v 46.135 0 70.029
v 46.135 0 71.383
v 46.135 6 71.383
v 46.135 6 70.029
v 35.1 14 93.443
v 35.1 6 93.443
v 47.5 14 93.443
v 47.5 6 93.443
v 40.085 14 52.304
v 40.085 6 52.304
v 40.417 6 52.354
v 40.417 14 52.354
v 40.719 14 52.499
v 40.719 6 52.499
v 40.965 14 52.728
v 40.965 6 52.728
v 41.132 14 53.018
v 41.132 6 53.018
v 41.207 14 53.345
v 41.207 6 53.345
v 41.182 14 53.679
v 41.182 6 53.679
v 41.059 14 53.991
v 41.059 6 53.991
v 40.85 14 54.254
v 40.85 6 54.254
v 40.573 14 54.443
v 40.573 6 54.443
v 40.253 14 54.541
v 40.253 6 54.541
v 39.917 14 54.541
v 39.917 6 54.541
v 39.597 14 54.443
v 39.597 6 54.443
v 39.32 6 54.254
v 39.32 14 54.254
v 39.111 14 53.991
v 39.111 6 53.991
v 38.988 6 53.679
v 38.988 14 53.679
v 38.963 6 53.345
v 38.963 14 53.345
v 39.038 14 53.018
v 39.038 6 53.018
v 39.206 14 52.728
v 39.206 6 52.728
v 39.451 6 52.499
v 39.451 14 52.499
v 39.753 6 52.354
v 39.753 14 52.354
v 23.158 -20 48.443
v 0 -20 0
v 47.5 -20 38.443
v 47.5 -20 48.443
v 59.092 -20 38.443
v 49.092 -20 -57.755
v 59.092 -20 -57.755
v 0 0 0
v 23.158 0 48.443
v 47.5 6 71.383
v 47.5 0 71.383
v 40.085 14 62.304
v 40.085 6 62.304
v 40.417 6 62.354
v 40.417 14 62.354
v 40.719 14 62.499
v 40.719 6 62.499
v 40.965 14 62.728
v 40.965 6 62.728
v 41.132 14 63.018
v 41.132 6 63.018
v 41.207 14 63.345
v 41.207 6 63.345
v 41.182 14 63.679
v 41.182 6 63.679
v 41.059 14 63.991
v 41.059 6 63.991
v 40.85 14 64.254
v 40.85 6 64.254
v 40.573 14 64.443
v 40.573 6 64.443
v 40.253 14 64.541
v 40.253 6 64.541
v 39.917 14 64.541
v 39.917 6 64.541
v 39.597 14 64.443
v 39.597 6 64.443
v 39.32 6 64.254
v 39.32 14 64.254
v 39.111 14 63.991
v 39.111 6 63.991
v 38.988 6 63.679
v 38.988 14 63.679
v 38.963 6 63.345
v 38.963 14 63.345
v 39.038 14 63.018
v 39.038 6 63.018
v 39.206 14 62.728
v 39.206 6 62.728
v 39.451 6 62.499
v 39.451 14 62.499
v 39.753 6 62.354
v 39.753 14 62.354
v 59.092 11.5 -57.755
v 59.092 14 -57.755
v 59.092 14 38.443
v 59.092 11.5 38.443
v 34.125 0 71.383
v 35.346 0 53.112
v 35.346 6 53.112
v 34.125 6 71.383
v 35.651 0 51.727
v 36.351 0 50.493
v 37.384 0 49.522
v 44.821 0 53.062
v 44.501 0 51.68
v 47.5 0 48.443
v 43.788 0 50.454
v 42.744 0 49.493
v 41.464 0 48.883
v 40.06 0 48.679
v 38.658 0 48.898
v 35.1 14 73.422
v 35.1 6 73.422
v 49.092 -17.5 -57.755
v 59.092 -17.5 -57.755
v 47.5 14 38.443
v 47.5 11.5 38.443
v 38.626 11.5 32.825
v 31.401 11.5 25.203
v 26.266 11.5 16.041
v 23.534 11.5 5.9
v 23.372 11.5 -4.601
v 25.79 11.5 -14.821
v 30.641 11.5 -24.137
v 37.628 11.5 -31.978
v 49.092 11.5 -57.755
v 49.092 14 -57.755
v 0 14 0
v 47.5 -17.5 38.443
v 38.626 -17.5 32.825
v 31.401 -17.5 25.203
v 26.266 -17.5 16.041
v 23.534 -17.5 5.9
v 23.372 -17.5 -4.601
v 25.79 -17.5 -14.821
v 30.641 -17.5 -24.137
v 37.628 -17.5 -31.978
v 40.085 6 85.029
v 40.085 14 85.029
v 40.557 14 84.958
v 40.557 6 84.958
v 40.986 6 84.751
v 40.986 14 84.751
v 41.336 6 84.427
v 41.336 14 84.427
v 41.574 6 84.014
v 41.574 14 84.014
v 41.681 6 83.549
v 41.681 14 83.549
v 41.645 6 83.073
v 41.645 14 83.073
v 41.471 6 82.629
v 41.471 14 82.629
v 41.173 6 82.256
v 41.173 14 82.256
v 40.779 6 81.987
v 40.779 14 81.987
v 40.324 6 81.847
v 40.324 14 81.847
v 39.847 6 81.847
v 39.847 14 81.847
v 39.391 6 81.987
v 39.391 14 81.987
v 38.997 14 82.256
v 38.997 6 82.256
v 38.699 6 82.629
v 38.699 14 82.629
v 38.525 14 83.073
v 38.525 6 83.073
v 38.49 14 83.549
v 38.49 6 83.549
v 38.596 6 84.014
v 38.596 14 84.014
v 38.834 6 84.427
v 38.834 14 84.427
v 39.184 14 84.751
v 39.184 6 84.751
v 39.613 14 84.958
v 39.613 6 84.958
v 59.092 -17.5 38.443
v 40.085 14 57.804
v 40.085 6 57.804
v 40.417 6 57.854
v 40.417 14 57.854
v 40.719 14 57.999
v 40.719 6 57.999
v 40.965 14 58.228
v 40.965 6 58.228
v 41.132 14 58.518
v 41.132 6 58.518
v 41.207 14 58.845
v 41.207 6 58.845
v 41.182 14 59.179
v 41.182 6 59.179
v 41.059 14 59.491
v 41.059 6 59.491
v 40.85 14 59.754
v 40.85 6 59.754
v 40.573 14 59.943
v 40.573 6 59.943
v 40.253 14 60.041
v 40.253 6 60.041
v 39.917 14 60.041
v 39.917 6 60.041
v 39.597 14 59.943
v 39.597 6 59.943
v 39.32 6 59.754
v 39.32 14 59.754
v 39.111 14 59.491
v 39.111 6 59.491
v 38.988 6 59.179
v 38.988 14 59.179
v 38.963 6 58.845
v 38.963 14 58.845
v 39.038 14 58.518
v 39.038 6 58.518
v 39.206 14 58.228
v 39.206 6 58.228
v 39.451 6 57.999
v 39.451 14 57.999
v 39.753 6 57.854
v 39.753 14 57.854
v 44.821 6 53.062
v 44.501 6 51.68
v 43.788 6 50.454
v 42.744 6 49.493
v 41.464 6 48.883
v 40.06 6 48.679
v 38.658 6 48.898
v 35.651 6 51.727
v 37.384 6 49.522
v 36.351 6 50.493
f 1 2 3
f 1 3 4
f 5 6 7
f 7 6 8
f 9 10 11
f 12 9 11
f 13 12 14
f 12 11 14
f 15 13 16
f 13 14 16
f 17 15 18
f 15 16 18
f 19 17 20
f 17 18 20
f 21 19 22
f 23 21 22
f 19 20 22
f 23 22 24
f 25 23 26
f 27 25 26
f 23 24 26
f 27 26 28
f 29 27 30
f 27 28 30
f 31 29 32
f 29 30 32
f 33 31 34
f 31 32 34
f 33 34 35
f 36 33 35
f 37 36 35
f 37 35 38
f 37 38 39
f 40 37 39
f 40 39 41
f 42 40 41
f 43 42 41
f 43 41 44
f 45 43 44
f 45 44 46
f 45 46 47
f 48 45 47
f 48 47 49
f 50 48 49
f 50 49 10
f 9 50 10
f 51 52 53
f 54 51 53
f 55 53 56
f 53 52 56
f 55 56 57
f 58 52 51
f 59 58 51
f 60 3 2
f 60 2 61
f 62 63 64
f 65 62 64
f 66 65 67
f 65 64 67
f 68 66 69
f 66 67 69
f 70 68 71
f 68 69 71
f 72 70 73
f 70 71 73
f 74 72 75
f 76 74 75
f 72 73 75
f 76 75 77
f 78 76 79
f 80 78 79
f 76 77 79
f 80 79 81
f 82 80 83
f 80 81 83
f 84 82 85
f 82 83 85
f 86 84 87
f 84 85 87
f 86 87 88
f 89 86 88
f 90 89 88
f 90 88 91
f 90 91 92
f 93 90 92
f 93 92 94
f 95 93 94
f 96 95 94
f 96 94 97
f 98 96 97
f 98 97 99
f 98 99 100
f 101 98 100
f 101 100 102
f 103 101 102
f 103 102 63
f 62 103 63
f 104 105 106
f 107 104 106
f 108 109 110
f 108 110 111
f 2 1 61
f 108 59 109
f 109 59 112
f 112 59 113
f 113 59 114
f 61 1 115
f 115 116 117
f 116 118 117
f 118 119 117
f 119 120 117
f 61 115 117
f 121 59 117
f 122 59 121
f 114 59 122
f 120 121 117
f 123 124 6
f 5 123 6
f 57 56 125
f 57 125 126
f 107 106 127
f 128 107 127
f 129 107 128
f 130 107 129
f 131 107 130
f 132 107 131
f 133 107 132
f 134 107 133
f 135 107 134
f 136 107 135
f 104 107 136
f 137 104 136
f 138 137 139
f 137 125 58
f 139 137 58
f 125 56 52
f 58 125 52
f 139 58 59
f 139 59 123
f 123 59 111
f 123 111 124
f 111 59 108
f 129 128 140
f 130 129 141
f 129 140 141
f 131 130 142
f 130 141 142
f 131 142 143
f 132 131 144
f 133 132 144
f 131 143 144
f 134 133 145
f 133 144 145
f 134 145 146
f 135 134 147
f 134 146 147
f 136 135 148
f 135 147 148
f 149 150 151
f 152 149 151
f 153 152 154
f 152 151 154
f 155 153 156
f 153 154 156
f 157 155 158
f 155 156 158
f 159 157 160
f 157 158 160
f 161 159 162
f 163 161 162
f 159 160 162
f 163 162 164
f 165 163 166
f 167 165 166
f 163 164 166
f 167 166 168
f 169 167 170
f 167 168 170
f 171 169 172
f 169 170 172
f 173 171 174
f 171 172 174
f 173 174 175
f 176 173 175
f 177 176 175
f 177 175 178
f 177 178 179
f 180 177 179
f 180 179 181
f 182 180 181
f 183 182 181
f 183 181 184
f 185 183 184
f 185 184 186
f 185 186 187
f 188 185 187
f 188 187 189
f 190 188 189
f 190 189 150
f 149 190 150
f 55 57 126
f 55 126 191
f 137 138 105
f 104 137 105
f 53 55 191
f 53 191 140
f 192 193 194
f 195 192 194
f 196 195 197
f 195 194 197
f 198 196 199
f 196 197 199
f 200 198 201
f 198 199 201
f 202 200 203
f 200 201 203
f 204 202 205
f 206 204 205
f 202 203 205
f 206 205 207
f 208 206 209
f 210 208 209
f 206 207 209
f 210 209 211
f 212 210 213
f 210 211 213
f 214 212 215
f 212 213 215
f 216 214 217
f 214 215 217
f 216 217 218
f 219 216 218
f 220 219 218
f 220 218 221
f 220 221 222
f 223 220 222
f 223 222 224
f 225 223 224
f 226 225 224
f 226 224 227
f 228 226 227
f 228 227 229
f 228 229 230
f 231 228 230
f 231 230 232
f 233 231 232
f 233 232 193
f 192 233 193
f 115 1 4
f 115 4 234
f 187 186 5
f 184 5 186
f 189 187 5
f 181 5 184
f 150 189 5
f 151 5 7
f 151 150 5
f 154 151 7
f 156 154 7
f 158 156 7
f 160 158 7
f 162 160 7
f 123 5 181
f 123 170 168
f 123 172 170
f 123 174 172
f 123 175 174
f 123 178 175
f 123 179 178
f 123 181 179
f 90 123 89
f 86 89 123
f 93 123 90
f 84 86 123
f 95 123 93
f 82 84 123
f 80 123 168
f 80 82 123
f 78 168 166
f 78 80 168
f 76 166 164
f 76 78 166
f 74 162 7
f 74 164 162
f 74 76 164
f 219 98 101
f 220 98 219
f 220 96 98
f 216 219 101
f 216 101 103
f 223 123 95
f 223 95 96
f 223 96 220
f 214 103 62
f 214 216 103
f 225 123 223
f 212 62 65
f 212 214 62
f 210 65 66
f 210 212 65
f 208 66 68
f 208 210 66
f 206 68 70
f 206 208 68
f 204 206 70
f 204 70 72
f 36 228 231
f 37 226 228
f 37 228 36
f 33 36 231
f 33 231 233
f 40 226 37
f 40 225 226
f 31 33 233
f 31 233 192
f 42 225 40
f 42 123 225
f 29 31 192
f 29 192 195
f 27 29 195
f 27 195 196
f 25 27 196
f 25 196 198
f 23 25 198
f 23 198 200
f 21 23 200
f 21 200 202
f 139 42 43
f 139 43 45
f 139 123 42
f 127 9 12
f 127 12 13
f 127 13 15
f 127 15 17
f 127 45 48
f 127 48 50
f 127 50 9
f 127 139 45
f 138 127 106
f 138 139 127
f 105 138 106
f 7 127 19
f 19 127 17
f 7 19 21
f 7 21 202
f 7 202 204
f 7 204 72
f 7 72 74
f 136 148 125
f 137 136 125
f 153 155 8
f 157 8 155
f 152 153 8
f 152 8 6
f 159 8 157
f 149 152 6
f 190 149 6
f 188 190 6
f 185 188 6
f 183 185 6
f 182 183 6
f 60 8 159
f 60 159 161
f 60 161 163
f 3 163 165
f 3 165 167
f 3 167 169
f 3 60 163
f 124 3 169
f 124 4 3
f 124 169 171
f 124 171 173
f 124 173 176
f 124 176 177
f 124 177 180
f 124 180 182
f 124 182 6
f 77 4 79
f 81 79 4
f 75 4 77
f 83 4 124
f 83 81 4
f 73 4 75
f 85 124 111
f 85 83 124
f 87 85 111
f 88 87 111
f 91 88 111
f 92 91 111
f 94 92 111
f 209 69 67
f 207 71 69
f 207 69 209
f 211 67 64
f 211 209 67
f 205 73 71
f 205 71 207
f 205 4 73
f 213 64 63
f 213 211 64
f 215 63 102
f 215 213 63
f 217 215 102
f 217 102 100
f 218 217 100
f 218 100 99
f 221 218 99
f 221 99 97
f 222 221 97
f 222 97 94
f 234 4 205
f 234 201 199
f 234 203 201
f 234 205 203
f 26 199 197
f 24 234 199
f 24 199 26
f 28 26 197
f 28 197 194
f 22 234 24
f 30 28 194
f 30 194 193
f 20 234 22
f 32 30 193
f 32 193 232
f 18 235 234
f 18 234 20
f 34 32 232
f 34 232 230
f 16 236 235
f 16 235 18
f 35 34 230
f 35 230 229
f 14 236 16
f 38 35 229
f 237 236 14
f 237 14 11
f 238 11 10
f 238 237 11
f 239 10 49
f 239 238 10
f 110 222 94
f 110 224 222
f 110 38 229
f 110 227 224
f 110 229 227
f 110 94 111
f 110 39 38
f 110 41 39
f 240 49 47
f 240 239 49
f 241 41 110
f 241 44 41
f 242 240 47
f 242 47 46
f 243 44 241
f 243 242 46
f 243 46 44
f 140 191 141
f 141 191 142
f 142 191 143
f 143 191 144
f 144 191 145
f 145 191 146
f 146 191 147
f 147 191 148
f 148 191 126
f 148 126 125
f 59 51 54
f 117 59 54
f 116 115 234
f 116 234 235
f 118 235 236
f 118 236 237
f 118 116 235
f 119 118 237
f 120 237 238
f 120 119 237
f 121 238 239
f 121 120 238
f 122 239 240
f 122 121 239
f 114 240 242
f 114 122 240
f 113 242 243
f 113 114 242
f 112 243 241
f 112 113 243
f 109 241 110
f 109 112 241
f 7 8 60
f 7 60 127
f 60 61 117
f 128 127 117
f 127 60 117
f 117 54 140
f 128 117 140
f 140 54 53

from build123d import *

# Parameters (mm, degrees)
BOSS_EXTRUDE1_DEPTH = 14
SKETCH3_R           = 4.125
CUT_EXTRUDE1_DEPTH  = 6
SKETCH5_R           = 1.125
CUT_EXTRUDE2_DEPTH  = 15
CUT_EXTRUDE5_DEPTH  = 6
CUT_EXTRUDE6_REACH  = 108.478
SKETCH16_R          = 1.6
BOSS_EXTRUDE2_START = 20
BOSS_EXTRUDE2_DEPTH = 20
BOSS_EXTRUDE3_DEPTH = 2.5
BOSS_EXTRUDE4_START = -34
BOSS_EXTRUDE4_DEPTH = 2.5


with BuildPart() as part:
    # Sketch1 → Boss-Extrude1 (new body)
    with BuildSketch(Plane(origin=(0, 0, 0), x_dir=(1, 0, 0), z_dir=(0, 1, 0))):
        with BuildLine():
            Line((47.5, -78.442713945), (47.5, -38.442713945))
            ThreePointArc((47.5, -38.442713945), (23.533579371, -5.900241558), (37.627970881, 31.977851779))
            Line((37.627970881, 31.977851779), (49.091933627, 57.755216031))
            Line((49.091933627, 57.755216031), (0, 0))
            Line((0, 0), (35.1, -73.422380253))
            Line((35.1, -73.422380253), (35.1, -93.442713945))
            Line((35.1, -93.442713945), (37.5, -93.442713945))
            Line((37.5, -93.442713945), (47.5, -93.442713945))
            Line((47.5, -93.442713945), (47.5, -78.442713945))
        make_face()
    extrude(amount=BOSS_EXTRUDE1_DEPTH)

    # Sketch3 → Cut-Extrude1 (cut)
    with BuildSketch(Plane.XZ):
        with BuildLine():
            Line((33.254958794, 84.403112572), (36.18509612, 92.428977457))
            Line((36.18509612, 92.428977457), (44.88509612, 92.428977457))
            Line((44.88509612, 92.428977457), (46.13509612, 88.028977457))
            Line((46.13509612, 88.028977457), (46.13509612, 70.028977457))
            Line((46.13509612, 70.028977457), (44.820911197, 53.062159312))
            ThreePointArc((44.820911197, 53.062159312), (40.059955227, 48.679043991), (35.34566343, 53.112310791))
            Line((35.34566343, 53.112310791), (33.254958794, 84.403112572))
        make_face()
        with Locations(Location((40.08509612, 83.428977457, 0), (0, 0, 90))):
            Circle(SKETCH3_R, mode=Mode.SUBTRACT)
    extrude(amount=-CUT_EXTRUDE1_DEPTH, mode=Mode.SUBTRACT)

    # Sketch5 → Cut-Extrude2 (cut)
    with BuildSketch(Plane.XZ.offset(-6)):
        with Locations(Location((40.08509612, 63.428977457, 0), (0, 0, 270))):
            Circle(SKETCH5_R)
        with Locations(Location((40.08509612, 58.928977457, 0), (0, 0, 270))):
            Circle(SKETCH5_R)
        with Locations(Location((40.08509612, 53.428977457, 0), (0, 0, 270))):
            Circle(SKETCH5_R)
    extrude(amount=-CUT_EXTRUDE2_DEPTH, mode=Mode.SUBTRACT)

    # Sketch15 → Cut-Extrude5 (cut)
    with BuildSketch(Plane(origin=(0, 6, 0), x_dir=(-1, 0, 0), z_dir=(0, -1, 0))):
        Polygon((-32.170978305, -71.382705183), (-57.86059863, -71.382705183), (-57.86059863, -110.098742661), (-30.980040887, -110.098742661), align=None)
    extrude(amount=CUT_EXTRUDE5_DEPTH, mode=Mode.SUBTRACT)

    # Sketch16 → Cut-Extrude6 (cut, up to next)
    with BuildSketch(Plane(origin=(0, 14, 0), x_dir=(1, 0, 0), z_dir=(0, 1, 0)), mode=Mode.PRIVATE) as cut_extrude6_sk1:
        with Locations(Location((40.08509612, -83.428977457, 0), (0, 0, 270))):
            Circle(SKETCH16_R)
    cut_extrude6_tool1 = extrude(cut_extrude6_sk1.sketch, amount=-CUT_EXTRUDE6_REACH, mode=Mode.PRIVATE) & part.part
    add(cut_extrude6_tool1.solids().sort_by_distance((40.085096, 14, 83.428977))[0], mode=Mode.SUBTRACT)

    # Sketch17 → Boss-Extrude2 (add)
    with BuildSketch(Plane(origin=(0, 0, 0), x_dir=(-1, 0, 0), z_dir=(0, -1, 0)).offset(BOSS_EXTRUDE2_START)):
        with BuildLine():
            Line((-37.627970881, 31.977851779), (-49.091933627, 57.755216031))
            Line((-49.091933627, 57.755216031), (0, 0))
            Line((0, 0), (-23.158323847, -48.442713945))
            Line((-23.158323847, -48.442713945), (-47.5, -48.442713945))
            Line((-47.5, -48.442713945), (-47.5, -38.442713945))
            ThreePointArc((-47.5, -38.442713945), (-23.533579371, -5.900241558), (-37.627970881, 31.977851779))
        make_face()
    extrude(amount=-BOSS_EXTRUDE2_DEPTH)

    # Sketch18 → Boss-Extrude3 (add)
    with BuildSketch(Plane(origin=(0, 14, 0), x_dir=(1, 0, 0), z_dir=(0, 1, 0))):
        Polygon((23.122023742, 27.202380873), (49.091933627, 57.755216031), (59.091933627, 57.755216031), (59.091933627, -38.442713945), (23.122023742, -38.442713945), align=None)
    extrude(amount=-BOSS_EXTRUDE3_DEPTH)

    # Sketch18<2> → Boss-Extrude4 (add)
    with BuildSketch(Plane(origin=(0, 14, 0), x_dir=(1, 0, 0), z_dir=(0, 1, 0)).offset(BOSS_EXTRUDE4_START)):
        Polygon((23.122023742, 27.202380873), (49.091933627, 57.755216031), (59.091933627, 57.755216031), (59.091933627, -38.442713945), (23.122023742, -38.442713945), align=None)
    extrude(amount=BOSS_EXTRUDE4_DEPTH)


solid = part.part
